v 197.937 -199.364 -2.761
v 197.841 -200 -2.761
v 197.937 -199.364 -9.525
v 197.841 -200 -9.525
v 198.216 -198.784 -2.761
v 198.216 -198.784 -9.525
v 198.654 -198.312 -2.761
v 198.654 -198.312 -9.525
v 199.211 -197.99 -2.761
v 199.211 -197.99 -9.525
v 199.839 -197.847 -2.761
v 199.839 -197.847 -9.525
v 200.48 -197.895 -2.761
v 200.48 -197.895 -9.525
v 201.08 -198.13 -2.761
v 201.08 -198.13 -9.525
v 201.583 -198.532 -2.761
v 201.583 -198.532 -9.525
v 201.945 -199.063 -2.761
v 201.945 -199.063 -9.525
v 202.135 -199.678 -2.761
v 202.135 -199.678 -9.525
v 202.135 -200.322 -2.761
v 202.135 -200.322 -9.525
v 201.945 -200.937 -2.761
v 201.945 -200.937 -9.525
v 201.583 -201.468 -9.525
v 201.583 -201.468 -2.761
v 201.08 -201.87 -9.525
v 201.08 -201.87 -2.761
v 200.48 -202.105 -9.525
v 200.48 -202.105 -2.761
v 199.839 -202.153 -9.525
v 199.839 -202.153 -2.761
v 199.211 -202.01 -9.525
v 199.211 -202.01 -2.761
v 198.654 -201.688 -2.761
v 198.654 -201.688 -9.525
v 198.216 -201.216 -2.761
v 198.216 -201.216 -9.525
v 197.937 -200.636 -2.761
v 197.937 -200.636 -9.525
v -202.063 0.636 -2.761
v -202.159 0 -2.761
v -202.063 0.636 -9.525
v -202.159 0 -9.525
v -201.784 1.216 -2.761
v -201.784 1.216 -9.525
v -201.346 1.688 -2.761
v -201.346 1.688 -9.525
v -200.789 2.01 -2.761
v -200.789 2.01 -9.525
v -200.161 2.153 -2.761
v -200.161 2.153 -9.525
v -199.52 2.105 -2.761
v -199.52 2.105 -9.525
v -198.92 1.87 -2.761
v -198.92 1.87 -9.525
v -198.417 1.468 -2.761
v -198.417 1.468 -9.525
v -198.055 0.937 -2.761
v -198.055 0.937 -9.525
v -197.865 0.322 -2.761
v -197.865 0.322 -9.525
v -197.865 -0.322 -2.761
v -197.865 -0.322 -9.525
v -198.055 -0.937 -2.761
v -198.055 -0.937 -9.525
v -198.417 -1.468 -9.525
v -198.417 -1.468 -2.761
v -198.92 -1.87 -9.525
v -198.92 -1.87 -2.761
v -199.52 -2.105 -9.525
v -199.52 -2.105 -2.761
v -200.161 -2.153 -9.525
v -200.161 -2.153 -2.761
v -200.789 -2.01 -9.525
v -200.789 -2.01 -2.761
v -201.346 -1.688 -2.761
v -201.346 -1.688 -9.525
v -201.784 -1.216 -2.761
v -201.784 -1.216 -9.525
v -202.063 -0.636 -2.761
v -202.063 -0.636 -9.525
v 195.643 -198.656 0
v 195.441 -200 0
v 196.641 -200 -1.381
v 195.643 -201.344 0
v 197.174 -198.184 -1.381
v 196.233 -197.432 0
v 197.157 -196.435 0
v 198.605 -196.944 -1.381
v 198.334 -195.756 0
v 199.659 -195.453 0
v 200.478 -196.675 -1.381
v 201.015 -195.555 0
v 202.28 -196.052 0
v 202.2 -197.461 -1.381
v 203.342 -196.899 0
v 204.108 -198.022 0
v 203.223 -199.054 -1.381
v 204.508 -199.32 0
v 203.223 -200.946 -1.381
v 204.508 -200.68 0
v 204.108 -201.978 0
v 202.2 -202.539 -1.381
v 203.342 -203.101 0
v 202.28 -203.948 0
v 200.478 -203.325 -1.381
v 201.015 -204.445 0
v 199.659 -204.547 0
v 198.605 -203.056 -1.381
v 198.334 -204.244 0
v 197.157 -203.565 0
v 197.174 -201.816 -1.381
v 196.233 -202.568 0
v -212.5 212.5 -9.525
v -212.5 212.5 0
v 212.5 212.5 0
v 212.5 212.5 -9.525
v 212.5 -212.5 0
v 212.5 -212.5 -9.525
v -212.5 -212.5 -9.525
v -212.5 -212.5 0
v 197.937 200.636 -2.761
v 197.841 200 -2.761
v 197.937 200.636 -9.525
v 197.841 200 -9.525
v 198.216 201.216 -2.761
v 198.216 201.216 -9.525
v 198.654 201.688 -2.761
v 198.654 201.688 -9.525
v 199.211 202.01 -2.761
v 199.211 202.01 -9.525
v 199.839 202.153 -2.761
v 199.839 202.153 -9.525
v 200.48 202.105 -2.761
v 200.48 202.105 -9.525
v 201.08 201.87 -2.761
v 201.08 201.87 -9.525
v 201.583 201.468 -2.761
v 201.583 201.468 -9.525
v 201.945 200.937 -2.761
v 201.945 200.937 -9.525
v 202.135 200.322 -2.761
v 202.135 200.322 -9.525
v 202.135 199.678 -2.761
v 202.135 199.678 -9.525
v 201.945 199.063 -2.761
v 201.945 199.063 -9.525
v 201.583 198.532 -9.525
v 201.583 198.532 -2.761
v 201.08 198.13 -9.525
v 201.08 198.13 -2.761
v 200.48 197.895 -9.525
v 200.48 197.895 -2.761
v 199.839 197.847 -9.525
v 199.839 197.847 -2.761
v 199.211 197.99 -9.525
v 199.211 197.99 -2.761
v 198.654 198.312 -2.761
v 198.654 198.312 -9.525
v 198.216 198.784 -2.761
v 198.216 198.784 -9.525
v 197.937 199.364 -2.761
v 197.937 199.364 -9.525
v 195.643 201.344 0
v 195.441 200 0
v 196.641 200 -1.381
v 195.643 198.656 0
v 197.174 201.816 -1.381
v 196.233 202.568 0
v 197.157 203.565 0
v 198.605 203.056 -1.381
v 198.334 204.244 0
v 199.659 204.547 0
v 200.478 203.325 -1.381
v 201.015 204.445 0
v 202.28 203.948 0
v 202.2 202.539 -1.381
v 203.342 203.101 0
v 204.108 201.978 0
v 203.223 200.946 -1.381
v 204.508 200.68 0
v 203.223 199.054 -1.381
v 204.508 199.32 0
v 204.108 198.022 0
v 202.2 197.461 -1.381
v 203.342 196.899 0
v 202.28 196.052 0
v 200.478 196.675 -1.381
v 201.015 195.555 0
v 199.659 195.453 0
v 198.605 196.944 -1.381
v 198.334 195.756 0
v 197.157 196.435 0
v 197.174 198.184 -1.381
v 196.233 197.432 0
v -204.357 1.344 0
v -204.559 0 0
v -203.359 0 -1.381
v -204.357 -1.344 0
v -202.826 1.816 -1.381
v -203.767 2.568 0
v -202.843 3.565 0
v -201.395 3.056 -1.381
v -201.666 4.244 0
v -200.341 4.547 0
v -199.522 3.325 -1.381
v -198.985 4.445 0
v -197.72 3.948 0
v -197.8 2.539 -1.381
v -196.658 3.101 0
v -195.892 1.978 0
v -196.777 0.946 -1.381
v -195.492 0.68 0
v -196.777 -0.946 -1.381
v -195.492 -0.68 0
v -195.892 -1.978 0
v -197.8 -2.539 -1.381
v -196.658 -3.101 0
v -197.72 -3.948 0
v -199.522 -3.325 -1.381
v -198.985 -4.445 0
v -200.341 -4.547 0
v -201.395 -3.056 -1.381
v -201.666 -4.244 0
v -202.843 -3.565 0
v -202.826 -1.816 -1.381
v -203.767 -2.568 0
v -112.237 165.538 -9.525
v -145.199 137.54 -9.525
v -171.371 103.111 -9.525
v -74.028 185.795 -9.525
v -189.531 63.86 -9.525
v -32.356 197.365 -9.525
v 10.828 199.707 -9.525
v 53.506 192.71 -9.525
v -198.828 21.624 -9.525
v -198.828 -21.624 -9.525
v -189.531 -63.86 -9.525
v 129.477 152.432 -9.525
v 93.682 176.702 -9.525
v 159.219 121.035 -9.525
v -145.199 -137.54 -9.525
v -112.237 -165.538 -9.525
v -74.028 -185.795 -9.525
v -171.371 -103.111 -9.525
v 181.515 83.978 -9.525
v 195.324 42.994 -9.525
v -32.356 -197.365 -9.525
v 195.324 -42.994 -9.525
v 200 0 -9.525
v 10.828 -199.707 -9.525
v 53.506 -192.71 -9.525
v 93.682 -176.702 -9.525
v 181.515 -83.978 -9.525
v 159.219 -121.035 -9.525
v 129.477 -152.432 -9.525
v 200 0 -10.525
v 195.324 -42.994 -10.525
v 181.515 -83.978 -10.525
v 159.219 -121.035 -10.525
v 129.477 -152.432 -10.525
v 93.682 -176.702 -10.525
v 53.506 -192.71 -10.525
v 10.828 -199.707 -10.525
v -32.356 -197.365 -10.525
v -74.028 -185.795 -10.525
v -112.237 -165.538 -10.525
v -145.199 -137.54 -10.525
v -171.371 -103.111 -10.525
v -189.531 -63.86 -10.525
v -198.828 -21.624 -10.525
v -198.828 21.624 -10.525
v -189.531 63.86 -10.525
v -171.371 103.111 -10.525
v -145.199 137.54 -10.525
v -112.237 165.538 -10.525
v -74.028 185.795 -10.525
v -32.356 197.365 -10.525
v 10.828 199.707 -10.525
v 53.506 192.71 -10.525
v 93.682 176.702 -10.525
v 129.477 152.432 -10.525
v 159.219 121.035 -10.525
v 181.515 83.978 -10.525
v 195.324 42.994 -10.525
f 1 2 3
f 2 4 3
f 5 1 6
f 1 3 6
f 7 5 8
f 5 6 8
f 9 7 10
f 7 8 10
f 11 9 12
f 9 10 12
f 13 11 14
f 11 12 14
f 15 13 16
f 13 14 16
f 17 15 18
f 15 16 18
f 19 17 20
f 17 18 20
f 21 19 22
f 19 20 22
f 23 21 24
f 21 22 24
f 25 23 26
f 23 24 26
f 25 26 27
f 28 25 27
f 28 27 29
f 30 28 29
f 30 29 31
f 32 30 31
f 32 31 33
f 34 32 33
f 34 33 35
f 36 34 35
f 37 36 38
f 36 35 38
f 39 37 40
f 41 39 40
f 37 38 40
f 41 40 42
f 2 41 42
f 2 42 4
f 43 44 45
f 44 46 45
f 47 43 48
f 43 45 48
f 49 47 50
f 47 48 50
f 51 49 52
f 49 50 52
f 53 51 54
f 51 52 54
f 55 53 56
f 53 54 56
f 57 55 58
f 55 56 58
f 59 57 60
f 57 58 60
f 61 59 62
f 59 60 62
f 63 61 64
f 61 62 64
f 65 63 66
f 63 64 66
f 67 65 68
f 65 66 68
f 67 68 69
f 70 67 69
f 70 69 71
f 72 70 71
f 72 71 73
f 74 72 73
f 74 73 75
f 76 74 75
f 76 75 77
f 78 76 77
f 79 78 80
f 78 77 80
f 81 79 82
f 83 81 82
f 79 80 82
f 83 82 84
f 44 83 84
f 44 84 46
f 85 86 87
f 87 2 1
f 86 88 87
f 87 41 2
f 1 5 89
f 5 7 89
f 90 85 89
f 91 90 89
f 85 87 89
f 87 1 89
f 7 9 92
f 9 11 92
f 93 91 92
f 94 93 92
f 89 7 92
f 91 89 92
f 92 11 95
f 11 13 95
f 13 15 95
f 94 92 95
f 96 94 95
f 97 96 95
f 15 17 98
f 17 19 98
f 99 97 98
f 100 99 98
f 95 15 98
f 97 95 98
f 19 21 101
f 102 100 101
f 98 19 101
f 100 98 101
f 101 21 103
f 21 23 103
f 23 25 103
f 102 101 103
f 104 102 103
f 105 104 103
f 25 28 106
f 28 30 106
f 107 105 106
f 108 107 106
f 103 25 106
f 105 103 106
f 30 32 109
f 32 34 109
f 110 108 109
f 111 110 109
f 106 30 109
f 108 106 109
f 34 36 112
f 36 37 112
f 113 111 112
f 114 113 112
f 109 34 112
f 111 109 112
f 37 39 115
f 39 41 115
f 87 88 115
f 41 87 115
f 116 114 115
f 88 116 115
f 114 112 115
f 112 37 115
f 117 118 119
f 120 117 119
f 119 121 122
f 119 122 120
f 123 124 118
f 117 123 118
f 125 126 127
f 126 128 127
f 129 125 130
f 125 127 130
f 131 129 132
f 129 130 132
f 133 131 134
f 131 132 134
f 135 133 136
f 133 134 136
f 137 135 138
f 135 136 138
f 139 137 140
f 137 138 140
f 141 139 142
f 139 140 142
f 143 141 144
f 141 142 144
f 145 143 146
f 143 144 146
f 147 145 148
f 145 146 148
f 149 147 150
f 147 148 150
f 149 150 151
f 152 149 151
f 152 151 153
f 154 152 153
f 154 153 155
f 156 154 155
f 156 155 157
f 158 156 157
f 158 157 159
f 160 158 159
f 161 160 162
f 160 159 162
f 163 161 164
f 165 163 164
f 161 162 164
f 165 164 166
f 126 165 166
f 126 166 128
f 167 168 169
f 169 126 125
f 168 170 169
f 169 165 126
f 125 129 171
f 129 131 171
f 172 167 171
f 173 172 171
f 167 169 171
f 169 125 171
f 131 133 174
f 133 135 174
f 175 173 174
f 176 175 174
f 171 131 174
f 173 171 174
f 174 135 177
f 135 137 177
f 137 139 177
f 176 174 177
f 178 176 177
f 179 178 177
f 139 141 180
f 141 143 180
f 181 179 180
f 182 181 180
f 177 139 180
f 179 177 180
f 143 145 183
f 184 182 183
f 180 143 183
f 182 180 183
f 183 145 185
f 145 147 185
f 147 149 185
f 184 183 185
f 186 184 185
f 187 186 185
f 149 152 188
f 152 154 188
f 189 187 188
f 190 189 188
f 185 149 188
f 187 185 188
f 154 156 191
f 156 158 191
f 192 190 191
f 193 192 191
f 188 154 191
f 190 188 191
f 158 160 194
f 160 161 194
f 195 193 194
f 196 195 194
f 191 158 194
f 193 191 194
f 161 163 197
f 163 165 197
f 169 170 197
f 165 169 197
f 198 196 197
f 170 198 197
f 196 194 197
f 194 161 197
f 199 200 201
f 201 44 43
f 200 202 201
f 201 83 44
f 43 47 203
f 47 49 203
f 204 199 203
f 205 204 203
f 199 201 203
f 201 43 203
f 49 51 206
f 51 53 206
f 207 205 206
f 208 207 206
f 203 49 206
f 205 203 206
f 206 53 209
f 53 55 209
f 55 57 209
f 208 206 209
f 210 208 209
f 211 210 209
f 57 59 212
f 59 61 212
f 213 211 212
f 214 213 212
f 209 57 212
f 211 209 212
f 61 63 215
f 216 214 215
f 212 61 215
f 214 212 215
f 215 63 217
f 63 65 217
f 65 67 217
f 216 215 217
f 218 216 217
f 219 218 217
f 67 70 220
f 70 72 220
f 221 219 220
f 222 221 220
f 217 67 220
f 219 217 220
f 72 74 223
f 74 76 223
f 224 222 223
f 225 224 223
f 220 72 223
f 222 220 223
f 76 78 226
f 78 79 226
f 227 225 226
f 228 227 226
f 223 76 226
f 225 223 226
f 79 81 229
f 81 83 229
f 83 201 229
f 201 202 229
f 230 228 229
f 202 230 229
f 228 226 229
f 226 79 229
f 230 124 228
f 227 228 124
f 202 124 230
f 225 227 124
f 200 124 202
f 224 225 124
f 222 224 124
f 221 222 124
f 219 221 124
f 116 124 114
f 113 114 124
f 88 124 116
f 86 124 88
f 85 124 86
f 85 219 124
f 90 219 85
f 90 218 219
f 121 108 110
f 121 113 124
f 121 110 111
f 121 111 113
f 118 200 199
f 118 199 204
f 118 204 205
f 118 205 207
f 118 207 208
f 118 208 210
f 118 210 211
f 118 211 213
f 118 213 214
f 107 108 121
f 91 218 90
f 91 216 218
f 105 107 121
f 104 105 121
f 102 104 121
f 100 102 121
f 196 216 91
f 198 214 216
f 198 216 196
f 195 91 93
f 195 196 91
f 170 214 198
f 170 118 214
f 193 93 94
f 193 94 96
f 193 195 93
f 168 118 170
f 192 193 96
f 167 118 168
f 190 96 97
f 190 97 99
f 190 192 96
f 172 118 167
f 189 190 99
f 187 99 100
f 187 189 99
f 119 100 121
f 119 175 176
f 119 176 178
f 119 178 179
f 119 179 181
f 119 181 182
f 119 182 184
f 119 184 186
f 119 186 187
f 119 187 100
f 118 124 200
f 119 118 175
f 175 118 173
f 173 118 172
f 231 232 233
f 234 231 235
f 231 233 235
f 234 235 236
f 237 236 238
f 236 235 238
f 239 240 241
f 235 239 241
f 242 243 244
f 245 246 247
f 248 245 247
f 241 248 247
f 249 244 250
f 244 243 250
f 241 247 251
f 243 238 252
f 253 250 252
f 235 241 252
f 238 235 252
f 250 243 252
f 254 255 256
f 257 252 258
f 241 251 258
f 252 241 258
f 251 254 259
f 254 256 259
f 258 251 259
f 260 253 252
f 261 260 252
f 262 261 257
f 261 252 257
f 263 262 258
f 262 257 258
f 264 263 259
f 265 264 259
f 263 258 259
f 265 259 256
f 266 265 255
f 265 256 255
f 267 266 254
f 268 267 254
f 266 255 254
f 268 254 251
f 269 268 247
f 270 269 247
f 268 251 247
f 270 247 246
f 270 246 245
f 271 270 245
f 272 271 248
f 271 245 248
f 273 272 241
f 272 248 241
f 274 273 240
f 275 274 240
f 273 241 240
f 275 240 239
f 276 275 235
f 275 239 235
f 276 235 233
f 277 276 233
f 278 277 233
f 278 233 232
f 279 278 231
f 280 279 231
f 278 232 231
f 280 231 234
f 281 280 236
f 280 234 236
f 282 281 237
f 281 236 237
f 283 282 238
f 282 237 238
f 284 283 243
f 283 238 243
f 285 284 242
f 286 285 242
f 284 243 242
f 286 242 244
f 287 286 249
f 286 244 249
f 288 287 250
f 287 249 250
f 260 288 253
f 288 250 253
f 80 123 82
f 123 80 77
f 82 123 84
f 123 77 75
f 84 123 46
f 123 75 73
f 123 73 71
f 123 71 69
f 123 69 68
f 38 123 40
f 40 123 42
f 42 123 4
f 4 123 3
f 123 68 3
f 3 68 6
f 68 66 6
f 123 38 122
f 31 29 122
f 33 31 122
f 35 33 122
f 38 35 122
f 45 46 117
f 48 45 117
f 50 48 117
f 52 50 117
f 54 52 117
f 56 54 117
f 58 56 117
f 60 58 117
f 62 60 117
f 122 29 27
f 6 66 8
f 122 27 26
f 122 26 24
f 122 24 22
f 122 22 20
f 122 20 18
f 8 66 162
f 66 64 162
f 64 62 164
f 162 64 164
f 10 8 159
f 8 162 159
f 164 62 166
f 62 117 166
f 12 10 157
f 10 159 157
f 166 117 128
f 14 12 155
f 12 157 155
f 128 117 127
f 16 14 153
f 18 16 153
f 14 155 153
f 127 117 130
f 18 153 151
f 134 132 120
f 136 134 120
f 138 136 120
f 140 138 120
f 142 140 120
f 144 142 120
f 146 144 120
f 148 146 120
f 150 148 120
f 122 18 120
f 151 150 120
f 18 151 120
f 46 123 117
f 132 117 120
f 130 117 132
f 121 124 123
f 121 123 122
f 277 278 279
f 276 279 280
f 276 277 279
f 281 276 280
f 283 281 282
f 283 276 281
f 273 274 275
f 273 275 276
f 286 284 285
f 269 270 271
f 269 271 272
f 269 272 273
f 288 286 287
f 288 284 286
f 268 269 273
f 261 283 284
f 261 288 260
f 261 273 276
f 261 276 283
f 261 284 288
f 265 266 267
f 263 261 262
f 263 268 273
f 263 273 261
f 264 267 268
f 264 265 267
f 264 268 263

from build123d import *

# Parameters (mm, degrees)
F0_W           = 425
F0_H           = 425
F1_DEPTH       = 9.525
F2_R           = 200
F3_DEPTH       = 1
F5_D           = 4.318
F5_CSINK_D     = 9.1186
F5_CSINK_ANGLE = 82


# Not quite as in the source:
# - a length typed as a fraction of an inch, garbled in the dataset ("3 / 203.2 mm" for 3/8 in), is restored


with BuildPart() as f1:
    # F0 (on Top) → F1 (new body)
    with BuildSketch(Plane.XY):
        Rectangle(F0_W, F0_H)
    extrude(amount=-F1_DEPTH)

    # F5 (through all)
    with Locations(Plane.XY):
        with Locations((200, -200), (200, 200), (-200, 0)):
            CounterSinkHole(F5_D / 2, F5_CSINK_D / 2, counter_sink_angle=F5_CSINK_ANGLE)


with BuildPart() as f3:
    # F2 (on face) → F3 (new body)
    with BuildSketch(Plane(origin=(0, 0, -9.525), x_dir=(1, 0, 0), z_dir=(0, 0, -1))):
        Circle(F2_R)
    extrude(amount=F3_DEPTH)


solid = Compound([f1.part, f3.part])
